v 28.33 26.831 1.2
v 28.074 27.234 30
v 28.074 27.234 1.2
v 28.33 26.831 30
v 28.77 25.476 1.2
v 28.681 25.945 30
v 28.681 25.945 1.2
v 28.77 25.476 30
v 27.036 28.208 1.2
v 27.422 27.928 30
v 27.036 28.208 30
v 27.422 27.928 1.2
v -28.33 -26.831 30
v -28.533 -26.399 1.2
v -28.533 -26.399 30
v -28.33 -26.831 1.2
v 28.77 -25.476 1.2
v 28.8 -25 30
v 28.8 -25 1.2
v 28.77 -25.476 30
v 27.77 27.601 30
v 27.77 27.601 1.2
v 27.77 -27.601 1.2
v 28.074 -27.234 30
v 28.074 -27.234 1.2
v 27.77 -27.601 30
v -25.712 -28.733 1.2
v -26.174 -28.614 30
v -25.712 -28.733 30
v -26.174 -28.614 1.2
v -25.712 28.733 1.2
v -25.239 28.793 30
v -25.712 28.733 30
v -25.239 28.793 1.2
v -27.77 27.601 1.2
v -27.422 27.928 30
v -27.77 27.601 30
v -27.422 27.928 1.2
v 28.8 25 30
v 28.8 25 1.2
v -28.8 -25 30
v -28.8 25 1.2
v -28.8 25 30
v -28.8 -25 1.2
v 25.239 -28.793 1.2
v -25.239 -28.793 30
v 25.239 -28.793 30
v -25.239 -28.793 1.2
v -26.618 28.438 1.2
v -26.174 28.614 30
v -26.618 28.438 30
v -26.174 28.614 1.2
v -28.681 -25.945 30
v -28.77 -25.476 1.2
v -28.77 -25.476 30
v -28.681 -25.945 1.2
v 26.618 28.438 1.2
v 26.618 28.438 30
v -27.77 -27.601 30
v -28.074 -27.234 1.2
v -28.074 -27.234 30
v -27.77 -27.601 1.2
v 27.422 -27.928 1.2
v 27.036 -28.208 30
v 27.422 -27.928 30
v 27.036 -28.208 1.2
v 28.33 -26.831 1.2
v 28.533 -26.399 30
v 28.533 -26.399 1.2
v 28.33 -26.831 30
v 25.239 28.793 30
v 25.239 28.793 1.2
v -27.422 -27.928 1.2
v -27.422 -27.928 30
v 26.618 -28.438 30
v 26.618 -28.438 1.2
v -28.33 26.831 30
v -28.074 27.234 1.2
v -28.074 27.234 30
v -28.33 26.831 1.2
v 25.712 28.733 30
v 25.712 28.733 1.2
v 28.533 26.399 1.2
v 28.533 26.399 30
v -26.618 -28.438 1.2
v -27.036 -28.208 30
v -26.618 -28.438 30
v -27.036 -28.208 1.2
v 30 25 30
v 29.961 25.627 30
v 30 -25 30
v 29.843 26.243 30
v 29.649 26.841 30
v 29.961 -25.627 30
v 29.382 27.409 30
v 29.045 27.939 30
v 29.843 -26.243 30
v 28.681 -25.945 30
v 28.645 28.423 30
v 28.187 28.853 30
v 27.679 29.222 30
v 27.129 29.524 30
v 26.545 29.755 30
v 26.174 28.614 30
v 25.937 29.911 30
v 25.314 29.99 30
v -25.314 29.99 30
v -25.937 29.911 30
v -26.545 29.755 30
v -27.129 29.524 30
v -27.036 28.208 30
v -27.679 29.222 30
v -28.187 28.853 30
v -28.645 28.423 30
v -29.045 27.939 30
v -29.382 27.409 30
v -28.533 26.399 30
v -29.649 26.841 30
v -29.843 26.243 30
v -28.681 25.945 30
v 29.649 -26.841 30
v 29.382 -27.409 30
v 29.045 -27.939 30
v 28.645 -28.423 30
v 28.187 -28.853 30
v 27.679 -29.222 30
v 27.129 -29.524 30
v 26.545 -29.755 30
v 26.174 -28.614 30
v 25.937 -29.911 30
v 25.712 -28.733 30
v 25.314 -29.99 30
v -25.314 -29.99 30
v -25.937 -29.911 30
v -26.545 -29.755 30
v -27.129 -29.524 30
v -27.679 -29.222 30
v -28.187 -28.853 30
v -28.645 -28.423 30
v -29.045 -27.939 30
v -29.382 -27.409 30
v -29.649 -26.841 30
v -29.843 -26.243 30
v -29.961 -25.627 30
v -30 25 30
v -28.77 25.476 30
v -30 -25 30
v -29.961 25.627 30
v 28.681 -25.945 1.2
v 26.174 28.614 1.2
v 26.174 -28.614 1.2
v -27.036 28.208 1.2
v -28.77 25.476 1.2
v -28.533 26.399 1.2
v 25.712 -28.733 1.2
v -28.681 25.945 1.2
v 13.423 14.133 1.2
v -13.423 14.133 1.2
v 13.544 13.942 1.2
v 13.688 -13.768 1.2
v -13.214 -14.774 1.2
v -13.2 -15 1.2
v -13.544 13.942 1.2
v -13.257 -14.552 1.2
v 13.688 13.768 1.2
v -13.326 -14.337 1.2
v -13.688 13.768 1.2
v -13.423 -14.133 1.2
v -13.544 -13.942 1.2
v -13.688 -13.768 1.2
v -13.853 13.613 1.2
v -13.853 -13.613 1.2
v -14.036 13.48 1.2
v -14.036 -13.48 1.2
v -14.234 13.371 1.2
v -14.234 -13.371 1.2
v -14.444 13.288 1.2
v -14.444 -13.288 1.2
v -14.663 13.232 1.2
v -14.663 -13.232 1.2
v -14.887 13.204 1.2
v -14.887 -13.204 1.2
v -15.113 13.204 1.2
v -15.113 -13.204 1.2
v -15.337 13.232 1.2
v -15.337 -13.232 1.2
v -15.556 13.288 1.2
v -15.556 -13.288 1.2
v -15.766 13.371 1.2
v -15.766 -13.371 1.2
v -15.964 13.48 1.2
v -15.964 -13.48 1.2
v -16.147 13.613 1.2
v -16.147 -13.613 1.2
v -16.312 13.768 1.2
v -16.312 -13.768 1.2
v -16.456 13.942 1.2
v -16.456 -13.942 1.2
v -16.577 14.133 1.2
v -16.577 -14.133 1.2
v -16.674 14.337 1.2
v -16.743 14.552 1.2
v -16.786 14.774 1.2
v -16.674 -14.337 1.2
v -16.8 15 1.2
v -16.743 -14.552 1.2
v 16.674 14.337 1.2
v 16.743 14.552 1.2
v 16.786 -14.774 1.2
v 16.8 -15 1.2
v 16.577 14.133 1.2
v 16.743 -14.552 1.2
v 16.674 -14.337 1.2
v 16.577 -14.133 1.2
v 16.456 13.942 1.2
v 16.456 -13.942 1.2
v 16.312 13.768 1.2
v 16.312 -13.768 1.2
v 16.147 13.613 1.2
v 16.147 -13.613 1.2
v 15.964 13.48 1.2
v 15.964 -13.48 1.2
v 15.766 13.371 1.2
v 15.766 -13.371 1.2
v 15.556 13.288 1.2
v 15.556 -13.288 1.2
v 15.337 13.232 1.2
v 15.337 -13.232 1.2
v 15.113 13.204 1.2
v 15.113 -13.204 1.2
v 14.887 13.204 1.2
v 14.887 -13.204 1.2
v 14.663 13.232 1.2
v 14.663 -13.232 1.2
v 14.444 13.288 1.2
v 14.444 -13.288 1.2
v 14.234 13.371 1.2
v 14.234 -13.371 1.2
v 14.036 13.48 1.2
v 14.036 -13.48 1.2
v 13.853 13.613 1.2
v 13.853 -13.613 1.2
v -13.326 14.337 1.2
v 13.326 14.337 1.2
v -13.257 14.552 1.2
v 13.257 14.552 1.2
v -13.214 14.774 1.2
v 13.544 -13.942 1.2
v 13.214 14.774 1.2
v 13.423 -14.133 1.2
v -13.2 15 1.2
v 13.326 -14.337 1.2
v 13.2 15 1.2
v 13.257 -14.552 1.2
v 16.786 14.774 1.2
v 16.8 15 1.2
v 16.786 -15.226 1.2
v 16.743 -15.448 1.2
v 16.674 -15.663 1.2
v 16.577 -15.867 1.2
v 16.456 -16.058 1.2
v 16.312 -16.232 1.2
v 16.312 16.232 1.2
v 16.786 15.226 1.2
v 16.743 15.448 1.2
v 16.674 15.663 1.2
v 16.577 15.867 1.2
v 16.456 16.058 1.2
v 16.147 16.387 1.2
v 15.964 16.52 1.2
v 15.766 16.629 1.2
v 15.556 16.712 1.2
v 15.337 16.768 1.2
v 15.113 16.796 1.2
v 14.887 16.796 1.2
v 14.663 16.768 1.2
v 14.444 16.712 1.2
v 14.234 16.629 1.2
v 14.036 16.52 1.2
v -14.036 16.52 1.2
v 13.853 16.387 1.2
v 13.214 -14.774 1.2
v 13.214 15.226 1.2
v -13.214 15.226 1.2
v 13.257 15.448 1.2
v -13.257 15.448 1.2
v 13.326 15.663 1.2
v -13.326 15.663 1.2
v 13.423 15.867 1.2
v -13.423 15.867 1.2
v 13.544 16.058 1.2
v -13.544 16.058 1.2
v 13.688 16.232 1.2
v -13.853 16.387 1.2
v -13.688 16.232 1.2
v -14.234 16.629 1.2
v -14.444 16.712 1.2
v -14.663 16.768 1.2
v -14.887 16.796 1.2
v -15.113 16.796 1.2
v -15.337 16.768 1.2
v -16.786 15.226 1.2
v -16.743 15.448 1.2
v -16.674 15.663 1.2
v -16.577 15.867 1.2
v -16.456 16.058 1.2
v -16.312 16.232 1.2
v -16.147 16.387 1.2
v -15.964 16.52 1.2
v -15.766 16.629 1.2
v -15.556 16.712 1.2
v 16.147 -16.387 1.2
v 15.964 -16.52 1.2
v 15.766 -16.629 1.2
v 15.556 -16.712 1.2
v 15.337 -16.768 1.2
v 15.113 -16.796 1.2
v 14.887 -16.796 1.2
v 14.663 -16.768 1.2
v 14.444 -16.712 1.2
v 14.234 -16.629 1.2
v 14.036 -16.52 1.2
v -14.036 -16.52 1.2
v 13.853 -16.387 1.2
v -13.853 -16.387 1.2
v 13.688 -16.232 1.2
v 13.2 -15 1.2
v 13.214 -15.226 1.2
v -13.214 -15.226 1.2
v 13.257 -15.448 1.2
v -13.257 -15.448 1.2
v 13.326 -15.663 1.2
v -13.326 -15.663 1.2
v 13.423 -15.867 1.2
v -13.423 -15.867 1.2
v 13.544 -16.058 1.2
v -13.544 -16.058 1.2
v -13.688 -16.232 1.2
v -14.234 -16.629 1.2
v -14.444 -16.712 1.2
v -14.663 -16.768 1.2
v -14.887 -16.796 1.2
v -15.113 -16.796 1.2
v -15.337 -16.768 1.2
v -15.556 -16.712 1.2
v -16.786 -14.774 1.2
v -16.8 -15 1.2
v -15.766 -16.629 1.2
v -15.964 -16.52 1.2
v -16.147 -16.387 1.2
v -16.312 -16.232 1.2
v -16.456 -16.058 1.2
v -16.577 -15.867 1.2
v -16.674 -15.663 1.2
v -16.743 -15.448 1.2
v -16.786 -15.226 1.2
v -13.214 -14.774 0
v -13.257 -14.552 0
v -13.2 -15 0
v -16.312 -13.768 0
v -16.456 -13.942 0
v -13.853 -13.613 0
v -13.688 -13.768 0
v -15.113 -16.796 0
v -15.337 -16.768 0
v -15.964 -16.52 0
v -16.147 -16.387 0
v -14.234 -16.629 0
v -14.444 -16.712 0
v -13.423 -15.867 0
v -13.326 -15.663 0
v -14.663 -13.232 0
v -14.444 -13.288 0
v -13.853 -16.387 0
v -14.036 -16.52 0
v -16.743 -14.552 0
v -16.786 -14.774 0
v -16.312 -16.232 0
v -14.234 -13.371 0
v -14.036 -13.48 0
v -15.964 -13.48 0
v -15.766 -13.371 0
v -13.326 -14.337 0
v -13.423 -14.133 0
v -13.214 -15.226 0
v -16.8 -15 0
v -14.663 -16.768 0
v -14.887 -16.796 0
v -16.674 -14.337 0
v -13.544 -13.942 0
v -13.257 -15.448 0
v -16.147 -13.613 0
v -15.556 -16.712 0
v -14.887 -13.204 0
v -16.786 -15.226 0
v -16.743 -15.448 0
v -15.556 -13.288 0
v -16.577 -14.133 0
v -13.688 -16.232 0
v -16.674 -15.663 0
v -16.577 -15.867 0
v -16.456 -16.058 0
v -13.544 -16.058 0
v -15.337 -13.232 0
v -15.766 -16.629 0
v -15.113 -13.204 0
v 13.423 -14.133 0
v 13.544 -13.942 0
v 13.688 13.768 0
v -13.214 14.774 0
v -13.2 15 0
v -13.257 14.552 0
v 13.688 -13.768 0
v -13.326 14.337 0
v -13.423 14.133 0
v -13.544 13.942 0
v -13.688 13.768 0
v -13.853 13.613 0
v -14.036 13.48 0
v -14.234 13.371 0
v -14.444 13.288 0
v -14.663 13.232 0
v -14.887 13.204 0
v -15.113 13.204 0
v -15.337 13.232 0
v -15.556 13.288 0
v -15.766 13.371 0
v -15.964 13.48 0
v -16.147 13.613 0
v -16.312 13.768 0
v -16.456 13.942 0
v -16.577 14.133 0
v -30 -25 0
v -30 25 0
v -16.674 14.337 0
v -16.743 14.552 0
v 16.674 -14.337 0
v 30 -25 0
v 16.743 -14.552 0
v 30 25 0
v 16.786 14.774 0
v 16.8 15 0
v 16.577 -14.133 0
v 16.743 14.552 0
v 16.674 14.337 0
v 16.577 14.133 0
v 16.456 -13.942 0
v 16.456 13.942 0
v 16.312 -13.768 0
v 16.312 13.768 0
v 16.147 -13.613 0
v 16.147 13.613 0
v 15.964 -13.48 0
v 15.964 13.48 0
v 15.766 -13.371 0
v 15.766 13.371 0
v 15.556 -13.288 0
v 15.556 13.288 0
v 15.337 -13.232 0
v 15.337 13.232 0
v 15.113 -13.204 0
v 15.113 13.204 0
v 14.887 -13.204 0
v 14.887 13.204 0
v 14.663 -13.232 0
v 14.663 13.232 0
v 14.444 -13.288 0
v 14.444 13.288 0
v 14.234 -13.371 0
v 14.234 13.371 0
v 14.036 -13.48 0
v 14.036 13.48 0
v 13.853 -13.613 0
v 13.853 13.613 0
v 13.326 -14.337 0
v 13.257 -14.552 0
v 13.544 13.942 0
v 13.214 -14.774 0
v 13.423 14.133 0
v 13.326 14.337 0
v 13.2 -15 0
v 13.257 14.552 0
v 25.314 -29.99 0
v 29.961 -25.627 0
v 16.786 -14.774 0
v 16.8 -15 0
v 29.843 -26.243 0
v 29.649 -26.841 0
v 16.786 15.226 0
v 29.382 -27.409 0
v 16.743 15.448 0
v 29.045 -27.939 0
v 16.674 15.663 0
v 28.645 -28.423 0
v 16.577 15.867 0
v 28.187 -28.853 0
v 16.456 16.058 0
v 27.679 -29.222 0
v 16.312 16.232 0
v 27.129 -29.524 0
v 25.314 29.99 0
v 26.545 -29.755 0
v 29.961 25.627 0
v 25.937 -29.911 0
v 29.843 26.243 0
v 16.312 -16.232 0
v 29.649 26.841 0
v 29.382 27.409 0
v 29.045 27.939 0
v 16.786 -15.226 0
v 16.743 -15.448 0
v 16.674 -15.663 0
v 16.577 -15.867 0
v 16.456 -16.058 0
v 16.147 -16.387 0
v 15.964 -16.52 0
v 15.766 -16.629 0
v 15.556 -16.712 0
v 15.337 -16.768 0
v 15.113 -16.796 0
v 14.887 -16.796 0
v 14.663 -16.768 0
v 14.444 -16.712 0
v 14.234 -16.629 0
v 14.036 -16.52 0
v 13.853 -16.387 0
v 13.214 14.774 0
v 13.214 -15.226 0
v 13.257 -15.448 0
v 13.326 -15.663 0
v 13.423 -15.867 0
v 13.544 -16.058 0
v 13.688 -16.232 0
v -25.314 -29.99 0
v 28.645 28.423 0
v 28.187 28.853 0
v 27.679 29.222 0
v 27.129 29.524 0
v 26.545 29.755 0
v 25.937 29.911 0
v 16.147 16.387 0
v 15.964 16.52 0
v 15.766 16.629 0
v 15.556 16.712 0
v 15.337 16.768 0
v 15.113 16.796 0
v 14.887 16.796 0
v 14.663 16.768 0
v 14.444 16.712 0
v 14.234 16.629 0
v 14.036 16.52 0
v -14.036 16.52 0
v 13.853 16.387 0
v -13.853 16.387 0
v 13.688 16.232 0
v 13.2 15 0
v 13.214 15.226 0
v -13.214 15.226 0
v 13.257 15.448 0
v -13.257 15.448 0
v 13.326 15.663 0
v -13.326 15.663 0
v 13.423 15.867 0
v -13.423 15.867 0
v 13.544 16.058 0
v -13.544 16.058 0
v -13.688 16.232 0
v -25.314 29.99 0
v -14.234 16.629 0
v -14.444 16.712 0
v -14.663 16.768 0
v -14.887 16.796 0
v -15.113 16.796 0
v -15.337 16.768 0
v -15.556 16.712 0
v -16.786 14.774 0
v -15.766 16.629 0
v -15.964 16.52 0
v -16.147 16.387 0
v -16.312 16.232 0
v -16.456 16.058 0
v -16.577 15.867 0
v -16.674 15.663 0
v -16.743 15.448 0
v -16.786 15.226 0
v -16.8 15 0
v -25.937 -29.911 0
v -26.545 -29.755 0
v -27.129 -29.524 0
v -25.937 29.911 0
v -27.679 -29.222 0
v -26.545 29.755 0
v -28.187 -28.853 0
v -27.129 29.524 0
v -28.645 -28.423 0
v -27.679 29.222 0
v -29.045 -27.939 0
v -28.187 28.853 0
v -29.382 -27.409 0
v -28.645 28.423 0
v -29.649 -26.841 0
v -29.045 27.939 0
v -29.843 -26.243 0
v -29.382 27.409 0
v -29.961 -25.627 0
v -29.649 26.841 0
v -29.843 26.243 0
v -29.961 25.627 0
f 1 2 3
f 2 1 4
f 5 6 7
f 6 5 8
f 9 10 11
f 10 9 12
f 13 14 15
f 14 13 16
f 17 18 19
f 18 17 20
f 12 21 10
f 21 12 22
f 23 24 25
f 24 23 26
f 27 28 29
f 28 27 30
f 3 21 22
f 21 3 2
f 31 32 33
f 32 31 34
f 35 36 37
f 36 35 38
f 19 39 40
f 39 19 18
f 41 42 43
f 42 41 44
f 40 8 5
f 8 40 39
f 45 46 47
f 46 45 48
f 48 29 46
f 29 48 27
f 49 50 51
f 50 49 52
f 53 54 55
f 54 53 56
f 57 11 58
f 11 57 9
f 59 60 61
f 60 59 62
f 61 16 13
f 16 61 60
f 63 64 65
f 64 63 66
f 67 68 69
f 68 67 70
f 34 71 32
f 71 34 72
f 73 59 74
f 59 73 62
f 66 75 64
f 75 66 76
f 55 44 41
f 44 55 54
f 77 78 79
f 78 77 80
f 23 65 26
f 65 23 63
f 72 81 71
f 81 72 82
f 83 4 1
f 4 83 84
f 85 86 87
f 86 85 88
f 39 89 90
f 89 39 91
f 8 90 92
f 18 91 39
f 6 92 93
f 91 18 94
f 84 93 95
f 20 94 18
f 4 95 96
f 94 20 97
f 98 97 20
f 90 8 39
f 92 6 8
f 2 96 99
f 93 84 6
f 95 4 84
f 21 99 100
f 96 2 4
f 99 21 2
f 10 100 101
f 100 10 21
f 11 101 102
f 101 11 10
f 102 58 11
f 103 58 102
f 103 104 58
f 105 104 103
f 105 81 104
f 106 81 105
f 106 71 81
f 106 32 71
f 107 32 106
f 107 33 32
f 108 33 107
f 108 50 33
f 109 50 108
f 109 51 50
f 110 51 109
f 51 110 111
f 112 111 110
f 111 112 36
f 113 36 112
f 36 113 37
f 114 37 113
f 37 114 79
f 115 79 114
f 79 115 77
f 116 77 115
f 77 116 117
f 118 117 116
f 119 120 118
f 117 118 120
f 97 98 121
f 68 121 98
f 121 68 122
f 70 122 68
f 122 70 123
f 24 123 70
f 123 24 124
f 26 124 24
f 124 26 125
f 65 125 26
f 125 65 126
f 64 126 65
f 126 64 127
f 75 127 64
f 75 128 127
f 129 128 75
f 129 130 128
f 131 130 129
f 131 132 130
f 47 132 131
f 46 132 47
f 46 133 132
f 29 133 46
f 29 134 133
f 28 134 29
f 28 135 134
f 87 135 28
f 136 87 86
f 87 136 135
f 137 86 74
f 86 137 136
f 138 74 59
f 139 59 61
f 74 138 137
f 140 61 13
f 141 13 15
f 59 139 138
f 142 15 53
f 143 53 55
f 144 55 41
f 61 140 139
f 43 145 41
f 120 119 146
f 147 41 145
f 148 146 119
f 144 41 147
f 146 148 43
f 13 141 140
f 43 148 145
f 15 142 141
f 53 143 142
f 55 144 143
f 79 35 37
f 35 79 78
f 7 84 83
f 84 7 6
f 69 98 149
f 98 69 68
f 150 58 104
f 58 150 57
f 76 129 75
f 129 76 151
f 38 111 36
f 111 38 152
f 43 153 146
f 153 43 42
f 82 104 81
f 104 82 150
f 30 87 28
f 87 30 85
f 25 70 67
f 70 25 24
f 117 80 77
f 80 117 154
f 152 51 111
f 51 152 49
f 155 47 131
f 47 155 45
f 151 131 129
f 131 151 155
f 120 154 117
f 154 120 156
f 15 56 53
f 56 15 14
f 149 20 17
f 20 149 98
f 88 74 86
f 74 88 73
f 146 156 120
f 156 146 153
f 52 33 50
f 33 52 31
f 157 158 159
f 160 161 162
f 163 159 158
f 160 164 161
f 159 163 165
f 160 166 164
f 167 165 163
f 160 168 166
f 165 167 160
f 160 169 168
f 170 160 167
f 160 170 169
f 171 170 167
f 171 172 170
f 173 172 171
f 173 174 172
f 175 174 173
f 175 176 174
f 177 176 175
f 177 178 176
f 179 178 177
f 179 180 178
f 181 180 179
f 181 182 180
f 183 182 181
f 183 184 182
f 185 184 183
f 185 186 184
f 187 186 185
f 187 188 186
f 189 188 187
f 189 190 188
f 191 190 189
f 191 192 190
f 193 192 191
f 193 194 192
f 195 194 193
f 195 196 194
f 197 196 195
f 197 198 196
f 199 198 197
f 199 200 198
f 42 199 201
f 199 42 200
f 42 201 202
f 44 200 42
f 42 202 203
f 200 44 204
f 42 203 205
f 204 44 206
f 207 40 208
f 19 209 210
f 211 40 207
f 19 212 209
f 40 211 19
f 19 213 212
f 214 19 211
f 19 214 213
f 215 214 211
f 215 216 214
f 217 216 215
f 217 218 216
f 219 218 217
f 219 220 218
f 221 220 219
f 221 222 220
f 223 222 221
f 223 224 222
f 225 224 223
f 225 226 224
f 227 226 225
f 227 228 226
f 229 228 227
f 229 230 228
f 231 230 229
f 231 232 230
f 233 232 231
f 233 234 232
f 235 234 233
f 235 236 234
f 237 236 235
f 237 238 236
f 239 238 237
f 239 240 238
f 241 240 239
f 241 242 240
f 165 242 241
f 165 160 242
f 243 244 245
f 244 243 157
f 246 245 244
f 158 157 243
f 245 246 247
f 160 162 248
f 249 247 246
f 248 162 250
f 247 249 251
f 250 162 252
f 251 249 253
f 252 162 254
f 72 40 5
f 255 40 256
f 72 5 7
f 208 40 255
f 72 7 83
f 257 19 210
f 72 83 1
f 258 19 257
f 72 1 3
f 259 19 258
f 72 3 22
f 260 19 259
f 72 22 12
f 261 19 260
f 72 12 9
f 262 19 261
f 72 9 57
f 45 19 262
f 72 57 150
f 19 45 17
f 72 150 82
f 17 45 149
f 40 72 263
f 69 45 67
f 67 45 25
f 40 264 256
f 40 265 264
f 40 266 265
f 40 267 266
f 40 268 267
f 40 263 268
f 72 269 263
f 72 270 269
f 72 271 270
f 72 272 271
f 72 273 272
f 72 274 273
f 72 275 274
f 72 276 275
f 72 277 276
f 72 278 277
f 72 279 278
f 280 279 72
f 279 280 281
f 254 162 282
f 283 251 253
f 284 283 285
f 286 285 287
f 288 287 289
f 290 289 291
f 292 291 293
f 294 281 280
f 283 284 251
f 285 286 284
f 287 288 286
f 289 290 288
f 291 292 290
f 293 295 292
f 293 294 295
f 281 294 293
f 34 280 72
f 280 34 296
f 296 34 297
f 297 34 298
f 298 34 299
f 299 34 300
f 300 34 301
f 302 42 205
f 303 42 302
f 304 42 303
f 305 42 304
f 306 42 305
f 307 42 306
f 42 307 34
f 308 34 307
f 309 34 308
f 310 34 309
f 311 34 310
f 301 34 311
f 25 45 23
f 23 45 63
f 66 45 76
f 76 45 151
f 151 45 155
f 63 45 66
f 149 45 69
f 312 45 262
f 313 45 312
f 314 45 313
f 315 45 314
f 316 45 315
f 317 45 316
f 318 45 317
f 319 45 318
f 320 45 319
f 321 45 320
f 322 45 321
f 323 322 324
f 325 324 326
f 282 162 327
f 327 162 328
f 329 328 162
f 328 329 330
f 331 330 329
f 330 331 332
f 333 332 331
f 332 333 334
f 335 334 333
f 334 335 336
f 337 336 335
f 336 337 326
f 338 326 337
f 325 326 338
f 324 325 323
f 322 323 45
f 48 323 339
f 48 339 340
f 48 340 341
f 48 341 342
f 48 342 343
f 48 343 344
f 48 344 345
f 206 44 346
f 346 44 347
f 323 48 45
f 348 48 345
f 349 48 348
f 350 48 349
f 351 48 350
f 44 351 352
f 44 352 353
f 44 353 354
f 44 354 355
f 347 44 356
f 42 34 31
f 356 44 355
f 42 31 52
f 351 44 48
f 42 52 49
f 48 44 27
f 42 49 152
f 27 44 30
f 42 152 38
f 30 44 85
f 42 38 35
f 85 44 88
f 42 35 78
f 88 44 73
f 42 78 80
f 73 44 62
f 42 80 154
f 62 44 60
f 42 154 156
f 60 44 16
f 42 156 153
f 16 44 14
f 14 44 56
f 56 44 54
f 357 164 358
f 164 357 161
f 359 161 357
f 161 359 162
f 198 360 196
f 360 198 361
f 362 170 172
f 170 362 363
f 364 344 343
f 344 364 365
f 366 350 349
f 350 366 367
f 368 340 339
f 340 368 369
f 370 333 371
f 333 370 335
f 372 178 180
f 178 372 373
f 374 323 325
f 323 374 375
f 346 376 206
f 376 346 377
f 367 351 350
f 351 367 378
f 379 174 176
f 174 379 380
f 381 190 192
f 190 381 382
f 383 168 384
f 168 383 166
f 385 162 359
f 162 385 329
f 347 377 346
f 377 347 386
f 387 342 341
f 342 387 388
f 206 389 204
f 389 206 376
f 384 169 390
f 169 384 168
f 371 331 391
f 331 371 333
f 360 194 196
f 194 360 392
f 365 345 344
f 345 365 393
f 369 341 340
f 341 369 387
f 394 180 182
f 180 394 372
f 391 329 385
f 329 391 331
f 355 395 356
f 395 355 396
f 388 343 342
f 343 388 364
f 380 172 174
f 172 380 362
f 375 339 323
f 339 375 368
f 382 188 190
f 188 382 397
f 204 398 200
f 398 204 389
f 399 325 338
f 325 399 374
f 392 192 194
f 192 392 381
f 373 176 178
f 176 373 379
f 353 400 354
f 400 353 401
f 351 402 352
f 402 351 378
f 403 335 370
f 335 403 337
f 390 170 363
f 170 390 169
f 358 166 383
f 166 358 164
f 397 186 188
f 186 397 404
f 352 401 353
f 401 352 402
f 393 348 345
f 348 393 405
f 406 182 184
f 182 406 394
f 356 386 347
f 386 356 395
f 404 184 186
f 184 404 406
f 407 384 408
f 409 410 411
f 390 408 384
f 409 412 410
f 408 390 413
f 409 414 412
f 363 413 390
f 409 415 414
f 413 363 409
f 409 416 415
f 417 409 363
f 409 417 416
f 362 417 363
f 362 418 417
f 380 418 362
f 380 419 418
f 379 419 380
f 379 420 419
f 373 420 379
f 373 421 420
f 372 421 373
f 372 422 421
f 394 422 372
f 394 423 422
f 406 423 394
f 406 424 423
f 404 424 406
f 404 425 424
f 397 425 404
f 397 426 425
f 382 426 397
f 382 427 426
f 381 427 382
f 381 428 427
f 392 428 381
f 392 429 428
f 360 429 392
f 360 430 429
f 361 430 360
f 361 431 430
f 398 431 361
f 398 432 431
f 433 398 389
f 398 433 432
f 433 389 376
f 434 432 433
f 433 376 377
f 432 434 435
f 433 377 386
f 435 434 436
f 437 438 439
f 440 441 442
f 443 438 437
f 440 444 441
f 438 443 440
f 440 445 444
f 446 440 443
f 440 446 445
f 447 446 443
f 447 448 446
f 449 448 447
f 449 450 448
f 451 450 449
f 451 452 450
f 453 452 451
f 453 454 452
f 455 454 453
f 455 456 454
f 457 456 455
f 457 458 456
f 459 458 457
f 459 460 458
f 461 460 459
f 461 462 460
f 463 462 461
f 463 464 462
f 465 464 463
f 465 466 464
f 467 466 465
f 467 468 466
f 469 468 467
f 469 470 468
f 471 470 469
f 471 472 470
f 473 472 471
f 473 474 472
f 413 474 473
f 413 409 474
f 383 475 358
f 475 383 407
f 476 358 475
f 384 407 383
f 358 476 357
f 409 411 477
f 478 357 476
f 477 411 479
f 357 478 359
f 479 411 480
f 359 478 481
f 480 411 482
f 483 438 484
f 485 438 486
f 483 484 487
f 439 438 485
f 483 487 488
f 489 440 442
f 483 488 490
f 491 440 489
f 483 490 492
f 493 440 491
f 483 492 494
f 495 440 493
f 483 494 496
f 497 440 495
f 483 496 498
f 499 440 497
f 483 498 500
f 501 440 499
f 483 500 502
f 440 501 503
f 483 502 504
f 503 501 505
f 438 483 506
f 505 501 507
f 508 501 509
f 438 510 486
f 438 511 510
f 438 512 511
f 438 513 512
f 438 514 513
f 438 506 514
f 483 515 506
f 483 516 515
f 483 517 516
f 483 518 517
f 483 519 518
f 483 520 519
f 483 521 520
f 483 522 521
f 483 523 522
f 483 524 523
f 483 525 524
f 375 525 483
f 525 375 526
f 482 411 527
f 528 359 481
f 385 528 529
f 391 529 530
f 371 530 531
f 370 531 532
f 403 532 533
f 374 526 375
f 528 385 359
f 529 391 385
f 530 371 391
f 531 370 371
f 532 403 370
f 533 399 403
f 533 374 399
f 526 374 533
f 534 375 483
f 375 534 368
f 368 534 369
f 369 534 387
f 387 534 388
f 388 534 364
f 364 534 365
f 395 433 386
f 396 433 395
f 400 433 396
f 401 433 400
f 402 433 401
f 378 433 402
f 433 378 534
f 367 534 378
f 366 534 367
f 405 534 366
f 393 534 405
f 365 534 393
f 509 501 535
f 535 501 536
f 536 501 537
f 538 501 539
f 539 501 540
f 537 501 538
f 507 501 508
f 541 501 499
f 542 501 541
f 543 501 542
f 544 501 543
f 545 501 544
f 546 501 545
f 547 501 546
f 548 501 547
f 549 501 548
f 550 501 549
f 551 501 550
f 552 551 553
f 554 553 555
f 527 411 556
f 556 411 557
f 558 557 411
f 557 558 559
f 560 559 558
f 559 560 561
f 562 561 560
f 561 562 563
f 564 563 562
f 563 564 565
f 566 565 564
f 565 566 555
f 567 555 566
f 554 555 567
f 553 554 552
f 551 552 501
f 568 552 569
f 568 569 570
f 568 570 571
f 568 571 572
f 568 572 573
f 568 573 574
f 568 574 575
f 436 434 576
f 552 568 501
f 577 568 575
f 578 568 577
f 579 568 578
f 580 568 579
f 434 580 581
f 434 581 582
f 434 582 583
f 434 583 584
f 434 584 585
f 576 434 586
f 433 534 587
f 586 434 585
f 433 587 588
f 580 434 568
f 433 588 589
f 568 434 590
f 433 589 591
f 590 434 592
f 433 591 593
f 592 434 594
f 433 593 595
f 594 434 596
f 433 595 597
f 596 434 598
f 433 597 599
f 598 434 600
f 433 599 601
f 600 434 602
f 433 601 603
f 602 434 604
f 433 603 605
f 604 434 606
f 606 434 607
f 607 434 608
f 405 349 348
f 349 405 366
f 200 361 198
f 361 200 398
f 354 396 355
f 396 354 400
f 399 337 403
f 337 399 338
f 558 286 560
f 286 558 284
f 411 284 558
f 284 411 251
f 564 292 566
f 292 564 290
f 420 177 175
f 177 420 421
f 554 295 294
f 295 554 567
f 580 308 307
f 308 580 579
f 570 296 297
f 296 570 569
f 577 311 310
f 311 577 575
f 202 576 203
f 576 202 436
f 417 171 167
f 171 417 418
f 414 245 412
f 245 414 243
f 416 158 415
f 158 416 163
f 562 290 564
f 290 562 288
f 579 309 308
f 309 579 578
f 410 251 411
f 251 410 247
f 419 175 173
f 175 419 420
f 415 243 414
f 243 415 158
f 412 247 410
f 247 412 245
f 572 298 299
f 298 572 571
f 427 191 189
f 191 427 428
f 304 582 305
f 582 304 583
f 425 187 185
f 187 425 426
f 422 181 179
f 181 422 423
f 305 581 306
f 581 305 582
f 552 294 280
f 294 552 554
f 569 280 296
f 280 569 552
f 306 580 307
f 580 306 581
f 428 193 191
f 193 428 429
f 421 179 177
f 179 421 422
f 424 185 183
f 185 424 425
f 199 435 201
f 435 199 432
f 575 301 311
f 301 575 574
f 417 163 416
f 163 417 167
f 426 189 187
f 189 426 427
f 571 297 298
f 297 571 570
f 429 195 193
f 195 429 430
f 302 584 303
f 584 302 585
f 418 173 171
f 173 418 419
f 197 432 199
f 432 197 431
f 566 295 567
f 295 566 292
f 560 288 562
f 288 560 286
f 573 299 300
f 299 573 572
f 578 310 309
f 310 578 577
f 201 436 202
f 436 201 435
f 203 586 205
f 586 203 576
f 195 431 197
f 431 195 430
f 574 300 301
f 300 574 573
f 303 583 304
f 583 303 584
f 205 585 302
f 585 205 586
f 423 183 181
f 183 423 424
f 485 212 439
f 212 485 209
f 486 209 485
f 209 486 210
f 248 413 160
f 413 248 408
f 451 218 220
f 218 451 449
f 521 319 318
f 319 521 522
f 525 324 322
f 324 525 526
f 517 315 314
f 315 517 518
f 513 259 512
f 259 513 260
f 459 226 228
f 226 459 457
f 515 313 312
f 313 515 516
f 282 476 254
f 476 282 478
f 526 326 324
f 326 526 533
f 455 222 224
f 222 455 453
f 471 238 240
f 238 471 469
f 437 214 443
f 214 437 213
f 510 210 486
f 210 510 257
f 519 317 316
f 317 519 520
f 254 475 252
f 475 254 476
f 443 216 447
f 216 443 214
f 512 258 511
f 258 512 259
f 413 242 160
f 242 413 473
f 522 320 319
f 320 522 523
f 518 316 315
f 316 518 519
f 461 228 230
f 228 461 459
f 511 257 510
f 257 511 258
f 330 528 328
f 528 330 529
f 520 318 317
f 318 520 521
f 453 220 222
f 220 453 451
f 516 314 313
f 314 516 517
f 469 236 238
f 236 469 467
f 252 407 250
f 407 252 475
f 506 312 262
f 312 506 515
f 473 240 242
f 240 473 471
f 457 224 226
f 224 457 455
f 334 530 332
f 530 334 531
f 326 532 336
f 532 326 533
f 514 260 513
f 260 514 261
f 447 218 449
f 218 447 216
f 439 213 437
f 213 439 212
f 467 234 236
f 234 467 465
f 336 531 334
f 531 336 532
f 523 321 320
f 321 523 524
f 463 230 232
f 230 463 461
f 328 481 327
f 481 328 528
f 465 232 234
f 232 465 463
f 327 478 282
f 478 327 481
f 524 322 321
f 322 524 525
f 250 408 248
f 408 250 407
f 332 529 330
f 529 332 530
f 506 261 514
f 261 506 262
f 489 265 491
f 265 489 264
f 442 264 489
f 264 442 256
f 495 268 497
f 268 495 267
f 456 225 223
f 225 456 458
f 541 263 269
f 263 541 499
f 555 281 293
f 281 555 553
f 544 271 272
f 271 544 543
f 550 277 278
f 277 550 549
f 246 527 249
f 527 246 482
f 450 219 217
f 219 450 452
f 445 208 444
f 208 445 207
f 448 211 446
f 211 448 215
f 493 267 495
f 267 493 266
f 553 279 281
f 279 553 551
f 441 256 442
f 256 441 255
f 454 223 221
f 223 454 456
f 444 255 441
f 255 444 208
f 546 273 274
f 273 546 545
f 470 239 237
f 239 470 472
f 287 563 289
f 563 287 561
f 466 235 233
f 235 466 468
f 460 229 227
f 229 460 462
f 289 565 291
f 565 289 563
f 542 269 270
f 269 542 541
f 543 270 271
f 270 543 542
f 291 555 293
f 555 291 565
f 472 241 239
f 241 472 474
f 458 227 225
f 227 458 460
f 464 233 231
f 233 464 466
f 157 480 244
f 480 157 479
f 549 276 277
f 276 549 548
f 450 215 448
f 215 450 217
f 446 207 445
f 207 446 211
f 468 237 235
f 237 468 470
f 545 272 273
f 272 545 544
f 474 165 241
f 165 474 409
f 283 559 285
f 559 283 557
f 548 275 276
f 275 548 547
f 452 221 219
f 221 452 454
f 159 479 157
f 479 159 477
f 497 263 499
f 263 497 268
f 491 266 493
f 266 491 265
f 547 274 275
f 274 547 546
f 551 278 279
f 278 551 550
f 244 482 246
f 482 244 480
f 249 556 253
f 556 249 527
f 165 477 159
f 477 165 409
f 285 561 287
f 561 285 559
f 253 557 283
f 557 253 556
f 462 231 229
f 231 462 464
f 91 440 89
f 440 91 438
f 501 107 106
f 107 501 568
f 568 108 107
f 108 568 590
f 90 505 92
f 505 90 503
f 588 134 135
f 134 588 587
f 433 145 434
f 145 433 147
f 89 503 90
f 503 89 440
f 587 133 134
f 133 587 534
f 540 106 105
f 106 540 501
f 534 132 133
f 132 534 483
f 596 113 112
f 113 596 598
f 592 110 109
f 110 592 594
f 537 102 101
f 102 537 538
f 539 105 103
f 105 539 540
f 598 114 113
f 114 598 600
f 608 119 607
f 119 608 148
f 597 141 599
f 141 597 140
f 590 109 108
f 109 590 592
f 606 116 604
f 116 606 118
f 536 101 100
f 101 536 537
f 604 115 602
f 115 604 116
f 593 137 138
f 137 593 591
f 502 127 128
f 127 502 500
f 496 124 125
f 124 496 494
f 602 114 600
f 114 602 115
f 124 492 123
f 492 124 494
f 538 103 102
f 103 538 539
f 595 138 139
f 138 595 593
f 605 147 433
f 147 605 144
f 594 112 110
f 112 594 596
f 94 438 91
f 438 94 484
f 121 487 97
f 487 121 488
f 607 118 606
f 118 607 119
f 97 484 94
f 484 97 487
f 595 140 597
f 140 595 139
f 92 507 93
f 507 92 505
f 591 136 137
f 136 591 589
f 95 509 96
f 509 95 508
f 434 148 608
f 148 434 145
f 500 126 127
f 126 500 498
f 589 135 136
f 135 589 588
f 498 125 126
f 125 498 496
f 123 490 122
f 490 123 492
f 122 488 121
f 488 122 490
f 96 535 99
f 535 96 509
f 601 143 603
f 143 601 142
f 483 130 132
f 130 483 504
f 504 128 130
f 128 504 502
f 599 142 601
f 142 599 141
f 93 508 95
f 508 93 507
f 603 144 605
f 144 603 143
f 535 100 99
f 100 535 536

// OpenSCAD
$fn = 50;


difference() {
	union() {
		hull() {
			translate(v = [-25.0000000000, 25.0000000000, 0]) {
				cylinder(h = 30, r = 5);
			}
			translate(v = [25.0000000000, 25.0000000000, 0]) {
				cylinder(h = 30, r = 5);
			}
			translate(v = [-25.0000000000, -25.0000000000, 0]) {
				cylinder(h = 30, r = 5);
			}
			translate(v = [25.0000000000, -25.0000000000, 0]) {
				cylinder(h = 30, r = 5);
			}
		}
	}
	union() {
		translate(v = [0, 0, 1.2000000000]) {
			hull() {
				translate(v = [-25.0000000000, 25.0000000000, 0]) {
					cylinder(h = 28.8000000000, r = 3.8000000000);
				}
				translate(v = [25.0000000000, 25.0000000000, 0]) {
					cylinder(h = 28.8000000000, r = 3.8000000000);
				}
				translate(v = [-25.0000000000, -25.0000000000, 0]) {
					cylinder(h = 28.8000000000, r = 3.8000000000);
				}
				translate(v = [25.0000000000, -25.0000000000, 0]) {
					cylinder(h = 28.8000000000, r = 3.8000000000);
				}
			}
		}
		#translate(v = [-15.0000000000, -15.0000000000, 0]) {
			cylinder(h = 1.2000000000, r = 1.8000000000);
		}
		#translate(v = [-15.0000000000, 15.0000000000, 0]) {
			cylinder(h = 1.2000000000, r = 1.8000000000);
		}
		#translate(v = [15.0000000000, -15.0000000000, 0]) {
			cylinder(h = 1.2000000000, r = 1.8000000000);
		}
		#translate(v = [15.0000000000, 15.0000000000, 0]) {
			cylinder(h = 1.2000000000, r = 1.8000000000);
		}
	}
}
